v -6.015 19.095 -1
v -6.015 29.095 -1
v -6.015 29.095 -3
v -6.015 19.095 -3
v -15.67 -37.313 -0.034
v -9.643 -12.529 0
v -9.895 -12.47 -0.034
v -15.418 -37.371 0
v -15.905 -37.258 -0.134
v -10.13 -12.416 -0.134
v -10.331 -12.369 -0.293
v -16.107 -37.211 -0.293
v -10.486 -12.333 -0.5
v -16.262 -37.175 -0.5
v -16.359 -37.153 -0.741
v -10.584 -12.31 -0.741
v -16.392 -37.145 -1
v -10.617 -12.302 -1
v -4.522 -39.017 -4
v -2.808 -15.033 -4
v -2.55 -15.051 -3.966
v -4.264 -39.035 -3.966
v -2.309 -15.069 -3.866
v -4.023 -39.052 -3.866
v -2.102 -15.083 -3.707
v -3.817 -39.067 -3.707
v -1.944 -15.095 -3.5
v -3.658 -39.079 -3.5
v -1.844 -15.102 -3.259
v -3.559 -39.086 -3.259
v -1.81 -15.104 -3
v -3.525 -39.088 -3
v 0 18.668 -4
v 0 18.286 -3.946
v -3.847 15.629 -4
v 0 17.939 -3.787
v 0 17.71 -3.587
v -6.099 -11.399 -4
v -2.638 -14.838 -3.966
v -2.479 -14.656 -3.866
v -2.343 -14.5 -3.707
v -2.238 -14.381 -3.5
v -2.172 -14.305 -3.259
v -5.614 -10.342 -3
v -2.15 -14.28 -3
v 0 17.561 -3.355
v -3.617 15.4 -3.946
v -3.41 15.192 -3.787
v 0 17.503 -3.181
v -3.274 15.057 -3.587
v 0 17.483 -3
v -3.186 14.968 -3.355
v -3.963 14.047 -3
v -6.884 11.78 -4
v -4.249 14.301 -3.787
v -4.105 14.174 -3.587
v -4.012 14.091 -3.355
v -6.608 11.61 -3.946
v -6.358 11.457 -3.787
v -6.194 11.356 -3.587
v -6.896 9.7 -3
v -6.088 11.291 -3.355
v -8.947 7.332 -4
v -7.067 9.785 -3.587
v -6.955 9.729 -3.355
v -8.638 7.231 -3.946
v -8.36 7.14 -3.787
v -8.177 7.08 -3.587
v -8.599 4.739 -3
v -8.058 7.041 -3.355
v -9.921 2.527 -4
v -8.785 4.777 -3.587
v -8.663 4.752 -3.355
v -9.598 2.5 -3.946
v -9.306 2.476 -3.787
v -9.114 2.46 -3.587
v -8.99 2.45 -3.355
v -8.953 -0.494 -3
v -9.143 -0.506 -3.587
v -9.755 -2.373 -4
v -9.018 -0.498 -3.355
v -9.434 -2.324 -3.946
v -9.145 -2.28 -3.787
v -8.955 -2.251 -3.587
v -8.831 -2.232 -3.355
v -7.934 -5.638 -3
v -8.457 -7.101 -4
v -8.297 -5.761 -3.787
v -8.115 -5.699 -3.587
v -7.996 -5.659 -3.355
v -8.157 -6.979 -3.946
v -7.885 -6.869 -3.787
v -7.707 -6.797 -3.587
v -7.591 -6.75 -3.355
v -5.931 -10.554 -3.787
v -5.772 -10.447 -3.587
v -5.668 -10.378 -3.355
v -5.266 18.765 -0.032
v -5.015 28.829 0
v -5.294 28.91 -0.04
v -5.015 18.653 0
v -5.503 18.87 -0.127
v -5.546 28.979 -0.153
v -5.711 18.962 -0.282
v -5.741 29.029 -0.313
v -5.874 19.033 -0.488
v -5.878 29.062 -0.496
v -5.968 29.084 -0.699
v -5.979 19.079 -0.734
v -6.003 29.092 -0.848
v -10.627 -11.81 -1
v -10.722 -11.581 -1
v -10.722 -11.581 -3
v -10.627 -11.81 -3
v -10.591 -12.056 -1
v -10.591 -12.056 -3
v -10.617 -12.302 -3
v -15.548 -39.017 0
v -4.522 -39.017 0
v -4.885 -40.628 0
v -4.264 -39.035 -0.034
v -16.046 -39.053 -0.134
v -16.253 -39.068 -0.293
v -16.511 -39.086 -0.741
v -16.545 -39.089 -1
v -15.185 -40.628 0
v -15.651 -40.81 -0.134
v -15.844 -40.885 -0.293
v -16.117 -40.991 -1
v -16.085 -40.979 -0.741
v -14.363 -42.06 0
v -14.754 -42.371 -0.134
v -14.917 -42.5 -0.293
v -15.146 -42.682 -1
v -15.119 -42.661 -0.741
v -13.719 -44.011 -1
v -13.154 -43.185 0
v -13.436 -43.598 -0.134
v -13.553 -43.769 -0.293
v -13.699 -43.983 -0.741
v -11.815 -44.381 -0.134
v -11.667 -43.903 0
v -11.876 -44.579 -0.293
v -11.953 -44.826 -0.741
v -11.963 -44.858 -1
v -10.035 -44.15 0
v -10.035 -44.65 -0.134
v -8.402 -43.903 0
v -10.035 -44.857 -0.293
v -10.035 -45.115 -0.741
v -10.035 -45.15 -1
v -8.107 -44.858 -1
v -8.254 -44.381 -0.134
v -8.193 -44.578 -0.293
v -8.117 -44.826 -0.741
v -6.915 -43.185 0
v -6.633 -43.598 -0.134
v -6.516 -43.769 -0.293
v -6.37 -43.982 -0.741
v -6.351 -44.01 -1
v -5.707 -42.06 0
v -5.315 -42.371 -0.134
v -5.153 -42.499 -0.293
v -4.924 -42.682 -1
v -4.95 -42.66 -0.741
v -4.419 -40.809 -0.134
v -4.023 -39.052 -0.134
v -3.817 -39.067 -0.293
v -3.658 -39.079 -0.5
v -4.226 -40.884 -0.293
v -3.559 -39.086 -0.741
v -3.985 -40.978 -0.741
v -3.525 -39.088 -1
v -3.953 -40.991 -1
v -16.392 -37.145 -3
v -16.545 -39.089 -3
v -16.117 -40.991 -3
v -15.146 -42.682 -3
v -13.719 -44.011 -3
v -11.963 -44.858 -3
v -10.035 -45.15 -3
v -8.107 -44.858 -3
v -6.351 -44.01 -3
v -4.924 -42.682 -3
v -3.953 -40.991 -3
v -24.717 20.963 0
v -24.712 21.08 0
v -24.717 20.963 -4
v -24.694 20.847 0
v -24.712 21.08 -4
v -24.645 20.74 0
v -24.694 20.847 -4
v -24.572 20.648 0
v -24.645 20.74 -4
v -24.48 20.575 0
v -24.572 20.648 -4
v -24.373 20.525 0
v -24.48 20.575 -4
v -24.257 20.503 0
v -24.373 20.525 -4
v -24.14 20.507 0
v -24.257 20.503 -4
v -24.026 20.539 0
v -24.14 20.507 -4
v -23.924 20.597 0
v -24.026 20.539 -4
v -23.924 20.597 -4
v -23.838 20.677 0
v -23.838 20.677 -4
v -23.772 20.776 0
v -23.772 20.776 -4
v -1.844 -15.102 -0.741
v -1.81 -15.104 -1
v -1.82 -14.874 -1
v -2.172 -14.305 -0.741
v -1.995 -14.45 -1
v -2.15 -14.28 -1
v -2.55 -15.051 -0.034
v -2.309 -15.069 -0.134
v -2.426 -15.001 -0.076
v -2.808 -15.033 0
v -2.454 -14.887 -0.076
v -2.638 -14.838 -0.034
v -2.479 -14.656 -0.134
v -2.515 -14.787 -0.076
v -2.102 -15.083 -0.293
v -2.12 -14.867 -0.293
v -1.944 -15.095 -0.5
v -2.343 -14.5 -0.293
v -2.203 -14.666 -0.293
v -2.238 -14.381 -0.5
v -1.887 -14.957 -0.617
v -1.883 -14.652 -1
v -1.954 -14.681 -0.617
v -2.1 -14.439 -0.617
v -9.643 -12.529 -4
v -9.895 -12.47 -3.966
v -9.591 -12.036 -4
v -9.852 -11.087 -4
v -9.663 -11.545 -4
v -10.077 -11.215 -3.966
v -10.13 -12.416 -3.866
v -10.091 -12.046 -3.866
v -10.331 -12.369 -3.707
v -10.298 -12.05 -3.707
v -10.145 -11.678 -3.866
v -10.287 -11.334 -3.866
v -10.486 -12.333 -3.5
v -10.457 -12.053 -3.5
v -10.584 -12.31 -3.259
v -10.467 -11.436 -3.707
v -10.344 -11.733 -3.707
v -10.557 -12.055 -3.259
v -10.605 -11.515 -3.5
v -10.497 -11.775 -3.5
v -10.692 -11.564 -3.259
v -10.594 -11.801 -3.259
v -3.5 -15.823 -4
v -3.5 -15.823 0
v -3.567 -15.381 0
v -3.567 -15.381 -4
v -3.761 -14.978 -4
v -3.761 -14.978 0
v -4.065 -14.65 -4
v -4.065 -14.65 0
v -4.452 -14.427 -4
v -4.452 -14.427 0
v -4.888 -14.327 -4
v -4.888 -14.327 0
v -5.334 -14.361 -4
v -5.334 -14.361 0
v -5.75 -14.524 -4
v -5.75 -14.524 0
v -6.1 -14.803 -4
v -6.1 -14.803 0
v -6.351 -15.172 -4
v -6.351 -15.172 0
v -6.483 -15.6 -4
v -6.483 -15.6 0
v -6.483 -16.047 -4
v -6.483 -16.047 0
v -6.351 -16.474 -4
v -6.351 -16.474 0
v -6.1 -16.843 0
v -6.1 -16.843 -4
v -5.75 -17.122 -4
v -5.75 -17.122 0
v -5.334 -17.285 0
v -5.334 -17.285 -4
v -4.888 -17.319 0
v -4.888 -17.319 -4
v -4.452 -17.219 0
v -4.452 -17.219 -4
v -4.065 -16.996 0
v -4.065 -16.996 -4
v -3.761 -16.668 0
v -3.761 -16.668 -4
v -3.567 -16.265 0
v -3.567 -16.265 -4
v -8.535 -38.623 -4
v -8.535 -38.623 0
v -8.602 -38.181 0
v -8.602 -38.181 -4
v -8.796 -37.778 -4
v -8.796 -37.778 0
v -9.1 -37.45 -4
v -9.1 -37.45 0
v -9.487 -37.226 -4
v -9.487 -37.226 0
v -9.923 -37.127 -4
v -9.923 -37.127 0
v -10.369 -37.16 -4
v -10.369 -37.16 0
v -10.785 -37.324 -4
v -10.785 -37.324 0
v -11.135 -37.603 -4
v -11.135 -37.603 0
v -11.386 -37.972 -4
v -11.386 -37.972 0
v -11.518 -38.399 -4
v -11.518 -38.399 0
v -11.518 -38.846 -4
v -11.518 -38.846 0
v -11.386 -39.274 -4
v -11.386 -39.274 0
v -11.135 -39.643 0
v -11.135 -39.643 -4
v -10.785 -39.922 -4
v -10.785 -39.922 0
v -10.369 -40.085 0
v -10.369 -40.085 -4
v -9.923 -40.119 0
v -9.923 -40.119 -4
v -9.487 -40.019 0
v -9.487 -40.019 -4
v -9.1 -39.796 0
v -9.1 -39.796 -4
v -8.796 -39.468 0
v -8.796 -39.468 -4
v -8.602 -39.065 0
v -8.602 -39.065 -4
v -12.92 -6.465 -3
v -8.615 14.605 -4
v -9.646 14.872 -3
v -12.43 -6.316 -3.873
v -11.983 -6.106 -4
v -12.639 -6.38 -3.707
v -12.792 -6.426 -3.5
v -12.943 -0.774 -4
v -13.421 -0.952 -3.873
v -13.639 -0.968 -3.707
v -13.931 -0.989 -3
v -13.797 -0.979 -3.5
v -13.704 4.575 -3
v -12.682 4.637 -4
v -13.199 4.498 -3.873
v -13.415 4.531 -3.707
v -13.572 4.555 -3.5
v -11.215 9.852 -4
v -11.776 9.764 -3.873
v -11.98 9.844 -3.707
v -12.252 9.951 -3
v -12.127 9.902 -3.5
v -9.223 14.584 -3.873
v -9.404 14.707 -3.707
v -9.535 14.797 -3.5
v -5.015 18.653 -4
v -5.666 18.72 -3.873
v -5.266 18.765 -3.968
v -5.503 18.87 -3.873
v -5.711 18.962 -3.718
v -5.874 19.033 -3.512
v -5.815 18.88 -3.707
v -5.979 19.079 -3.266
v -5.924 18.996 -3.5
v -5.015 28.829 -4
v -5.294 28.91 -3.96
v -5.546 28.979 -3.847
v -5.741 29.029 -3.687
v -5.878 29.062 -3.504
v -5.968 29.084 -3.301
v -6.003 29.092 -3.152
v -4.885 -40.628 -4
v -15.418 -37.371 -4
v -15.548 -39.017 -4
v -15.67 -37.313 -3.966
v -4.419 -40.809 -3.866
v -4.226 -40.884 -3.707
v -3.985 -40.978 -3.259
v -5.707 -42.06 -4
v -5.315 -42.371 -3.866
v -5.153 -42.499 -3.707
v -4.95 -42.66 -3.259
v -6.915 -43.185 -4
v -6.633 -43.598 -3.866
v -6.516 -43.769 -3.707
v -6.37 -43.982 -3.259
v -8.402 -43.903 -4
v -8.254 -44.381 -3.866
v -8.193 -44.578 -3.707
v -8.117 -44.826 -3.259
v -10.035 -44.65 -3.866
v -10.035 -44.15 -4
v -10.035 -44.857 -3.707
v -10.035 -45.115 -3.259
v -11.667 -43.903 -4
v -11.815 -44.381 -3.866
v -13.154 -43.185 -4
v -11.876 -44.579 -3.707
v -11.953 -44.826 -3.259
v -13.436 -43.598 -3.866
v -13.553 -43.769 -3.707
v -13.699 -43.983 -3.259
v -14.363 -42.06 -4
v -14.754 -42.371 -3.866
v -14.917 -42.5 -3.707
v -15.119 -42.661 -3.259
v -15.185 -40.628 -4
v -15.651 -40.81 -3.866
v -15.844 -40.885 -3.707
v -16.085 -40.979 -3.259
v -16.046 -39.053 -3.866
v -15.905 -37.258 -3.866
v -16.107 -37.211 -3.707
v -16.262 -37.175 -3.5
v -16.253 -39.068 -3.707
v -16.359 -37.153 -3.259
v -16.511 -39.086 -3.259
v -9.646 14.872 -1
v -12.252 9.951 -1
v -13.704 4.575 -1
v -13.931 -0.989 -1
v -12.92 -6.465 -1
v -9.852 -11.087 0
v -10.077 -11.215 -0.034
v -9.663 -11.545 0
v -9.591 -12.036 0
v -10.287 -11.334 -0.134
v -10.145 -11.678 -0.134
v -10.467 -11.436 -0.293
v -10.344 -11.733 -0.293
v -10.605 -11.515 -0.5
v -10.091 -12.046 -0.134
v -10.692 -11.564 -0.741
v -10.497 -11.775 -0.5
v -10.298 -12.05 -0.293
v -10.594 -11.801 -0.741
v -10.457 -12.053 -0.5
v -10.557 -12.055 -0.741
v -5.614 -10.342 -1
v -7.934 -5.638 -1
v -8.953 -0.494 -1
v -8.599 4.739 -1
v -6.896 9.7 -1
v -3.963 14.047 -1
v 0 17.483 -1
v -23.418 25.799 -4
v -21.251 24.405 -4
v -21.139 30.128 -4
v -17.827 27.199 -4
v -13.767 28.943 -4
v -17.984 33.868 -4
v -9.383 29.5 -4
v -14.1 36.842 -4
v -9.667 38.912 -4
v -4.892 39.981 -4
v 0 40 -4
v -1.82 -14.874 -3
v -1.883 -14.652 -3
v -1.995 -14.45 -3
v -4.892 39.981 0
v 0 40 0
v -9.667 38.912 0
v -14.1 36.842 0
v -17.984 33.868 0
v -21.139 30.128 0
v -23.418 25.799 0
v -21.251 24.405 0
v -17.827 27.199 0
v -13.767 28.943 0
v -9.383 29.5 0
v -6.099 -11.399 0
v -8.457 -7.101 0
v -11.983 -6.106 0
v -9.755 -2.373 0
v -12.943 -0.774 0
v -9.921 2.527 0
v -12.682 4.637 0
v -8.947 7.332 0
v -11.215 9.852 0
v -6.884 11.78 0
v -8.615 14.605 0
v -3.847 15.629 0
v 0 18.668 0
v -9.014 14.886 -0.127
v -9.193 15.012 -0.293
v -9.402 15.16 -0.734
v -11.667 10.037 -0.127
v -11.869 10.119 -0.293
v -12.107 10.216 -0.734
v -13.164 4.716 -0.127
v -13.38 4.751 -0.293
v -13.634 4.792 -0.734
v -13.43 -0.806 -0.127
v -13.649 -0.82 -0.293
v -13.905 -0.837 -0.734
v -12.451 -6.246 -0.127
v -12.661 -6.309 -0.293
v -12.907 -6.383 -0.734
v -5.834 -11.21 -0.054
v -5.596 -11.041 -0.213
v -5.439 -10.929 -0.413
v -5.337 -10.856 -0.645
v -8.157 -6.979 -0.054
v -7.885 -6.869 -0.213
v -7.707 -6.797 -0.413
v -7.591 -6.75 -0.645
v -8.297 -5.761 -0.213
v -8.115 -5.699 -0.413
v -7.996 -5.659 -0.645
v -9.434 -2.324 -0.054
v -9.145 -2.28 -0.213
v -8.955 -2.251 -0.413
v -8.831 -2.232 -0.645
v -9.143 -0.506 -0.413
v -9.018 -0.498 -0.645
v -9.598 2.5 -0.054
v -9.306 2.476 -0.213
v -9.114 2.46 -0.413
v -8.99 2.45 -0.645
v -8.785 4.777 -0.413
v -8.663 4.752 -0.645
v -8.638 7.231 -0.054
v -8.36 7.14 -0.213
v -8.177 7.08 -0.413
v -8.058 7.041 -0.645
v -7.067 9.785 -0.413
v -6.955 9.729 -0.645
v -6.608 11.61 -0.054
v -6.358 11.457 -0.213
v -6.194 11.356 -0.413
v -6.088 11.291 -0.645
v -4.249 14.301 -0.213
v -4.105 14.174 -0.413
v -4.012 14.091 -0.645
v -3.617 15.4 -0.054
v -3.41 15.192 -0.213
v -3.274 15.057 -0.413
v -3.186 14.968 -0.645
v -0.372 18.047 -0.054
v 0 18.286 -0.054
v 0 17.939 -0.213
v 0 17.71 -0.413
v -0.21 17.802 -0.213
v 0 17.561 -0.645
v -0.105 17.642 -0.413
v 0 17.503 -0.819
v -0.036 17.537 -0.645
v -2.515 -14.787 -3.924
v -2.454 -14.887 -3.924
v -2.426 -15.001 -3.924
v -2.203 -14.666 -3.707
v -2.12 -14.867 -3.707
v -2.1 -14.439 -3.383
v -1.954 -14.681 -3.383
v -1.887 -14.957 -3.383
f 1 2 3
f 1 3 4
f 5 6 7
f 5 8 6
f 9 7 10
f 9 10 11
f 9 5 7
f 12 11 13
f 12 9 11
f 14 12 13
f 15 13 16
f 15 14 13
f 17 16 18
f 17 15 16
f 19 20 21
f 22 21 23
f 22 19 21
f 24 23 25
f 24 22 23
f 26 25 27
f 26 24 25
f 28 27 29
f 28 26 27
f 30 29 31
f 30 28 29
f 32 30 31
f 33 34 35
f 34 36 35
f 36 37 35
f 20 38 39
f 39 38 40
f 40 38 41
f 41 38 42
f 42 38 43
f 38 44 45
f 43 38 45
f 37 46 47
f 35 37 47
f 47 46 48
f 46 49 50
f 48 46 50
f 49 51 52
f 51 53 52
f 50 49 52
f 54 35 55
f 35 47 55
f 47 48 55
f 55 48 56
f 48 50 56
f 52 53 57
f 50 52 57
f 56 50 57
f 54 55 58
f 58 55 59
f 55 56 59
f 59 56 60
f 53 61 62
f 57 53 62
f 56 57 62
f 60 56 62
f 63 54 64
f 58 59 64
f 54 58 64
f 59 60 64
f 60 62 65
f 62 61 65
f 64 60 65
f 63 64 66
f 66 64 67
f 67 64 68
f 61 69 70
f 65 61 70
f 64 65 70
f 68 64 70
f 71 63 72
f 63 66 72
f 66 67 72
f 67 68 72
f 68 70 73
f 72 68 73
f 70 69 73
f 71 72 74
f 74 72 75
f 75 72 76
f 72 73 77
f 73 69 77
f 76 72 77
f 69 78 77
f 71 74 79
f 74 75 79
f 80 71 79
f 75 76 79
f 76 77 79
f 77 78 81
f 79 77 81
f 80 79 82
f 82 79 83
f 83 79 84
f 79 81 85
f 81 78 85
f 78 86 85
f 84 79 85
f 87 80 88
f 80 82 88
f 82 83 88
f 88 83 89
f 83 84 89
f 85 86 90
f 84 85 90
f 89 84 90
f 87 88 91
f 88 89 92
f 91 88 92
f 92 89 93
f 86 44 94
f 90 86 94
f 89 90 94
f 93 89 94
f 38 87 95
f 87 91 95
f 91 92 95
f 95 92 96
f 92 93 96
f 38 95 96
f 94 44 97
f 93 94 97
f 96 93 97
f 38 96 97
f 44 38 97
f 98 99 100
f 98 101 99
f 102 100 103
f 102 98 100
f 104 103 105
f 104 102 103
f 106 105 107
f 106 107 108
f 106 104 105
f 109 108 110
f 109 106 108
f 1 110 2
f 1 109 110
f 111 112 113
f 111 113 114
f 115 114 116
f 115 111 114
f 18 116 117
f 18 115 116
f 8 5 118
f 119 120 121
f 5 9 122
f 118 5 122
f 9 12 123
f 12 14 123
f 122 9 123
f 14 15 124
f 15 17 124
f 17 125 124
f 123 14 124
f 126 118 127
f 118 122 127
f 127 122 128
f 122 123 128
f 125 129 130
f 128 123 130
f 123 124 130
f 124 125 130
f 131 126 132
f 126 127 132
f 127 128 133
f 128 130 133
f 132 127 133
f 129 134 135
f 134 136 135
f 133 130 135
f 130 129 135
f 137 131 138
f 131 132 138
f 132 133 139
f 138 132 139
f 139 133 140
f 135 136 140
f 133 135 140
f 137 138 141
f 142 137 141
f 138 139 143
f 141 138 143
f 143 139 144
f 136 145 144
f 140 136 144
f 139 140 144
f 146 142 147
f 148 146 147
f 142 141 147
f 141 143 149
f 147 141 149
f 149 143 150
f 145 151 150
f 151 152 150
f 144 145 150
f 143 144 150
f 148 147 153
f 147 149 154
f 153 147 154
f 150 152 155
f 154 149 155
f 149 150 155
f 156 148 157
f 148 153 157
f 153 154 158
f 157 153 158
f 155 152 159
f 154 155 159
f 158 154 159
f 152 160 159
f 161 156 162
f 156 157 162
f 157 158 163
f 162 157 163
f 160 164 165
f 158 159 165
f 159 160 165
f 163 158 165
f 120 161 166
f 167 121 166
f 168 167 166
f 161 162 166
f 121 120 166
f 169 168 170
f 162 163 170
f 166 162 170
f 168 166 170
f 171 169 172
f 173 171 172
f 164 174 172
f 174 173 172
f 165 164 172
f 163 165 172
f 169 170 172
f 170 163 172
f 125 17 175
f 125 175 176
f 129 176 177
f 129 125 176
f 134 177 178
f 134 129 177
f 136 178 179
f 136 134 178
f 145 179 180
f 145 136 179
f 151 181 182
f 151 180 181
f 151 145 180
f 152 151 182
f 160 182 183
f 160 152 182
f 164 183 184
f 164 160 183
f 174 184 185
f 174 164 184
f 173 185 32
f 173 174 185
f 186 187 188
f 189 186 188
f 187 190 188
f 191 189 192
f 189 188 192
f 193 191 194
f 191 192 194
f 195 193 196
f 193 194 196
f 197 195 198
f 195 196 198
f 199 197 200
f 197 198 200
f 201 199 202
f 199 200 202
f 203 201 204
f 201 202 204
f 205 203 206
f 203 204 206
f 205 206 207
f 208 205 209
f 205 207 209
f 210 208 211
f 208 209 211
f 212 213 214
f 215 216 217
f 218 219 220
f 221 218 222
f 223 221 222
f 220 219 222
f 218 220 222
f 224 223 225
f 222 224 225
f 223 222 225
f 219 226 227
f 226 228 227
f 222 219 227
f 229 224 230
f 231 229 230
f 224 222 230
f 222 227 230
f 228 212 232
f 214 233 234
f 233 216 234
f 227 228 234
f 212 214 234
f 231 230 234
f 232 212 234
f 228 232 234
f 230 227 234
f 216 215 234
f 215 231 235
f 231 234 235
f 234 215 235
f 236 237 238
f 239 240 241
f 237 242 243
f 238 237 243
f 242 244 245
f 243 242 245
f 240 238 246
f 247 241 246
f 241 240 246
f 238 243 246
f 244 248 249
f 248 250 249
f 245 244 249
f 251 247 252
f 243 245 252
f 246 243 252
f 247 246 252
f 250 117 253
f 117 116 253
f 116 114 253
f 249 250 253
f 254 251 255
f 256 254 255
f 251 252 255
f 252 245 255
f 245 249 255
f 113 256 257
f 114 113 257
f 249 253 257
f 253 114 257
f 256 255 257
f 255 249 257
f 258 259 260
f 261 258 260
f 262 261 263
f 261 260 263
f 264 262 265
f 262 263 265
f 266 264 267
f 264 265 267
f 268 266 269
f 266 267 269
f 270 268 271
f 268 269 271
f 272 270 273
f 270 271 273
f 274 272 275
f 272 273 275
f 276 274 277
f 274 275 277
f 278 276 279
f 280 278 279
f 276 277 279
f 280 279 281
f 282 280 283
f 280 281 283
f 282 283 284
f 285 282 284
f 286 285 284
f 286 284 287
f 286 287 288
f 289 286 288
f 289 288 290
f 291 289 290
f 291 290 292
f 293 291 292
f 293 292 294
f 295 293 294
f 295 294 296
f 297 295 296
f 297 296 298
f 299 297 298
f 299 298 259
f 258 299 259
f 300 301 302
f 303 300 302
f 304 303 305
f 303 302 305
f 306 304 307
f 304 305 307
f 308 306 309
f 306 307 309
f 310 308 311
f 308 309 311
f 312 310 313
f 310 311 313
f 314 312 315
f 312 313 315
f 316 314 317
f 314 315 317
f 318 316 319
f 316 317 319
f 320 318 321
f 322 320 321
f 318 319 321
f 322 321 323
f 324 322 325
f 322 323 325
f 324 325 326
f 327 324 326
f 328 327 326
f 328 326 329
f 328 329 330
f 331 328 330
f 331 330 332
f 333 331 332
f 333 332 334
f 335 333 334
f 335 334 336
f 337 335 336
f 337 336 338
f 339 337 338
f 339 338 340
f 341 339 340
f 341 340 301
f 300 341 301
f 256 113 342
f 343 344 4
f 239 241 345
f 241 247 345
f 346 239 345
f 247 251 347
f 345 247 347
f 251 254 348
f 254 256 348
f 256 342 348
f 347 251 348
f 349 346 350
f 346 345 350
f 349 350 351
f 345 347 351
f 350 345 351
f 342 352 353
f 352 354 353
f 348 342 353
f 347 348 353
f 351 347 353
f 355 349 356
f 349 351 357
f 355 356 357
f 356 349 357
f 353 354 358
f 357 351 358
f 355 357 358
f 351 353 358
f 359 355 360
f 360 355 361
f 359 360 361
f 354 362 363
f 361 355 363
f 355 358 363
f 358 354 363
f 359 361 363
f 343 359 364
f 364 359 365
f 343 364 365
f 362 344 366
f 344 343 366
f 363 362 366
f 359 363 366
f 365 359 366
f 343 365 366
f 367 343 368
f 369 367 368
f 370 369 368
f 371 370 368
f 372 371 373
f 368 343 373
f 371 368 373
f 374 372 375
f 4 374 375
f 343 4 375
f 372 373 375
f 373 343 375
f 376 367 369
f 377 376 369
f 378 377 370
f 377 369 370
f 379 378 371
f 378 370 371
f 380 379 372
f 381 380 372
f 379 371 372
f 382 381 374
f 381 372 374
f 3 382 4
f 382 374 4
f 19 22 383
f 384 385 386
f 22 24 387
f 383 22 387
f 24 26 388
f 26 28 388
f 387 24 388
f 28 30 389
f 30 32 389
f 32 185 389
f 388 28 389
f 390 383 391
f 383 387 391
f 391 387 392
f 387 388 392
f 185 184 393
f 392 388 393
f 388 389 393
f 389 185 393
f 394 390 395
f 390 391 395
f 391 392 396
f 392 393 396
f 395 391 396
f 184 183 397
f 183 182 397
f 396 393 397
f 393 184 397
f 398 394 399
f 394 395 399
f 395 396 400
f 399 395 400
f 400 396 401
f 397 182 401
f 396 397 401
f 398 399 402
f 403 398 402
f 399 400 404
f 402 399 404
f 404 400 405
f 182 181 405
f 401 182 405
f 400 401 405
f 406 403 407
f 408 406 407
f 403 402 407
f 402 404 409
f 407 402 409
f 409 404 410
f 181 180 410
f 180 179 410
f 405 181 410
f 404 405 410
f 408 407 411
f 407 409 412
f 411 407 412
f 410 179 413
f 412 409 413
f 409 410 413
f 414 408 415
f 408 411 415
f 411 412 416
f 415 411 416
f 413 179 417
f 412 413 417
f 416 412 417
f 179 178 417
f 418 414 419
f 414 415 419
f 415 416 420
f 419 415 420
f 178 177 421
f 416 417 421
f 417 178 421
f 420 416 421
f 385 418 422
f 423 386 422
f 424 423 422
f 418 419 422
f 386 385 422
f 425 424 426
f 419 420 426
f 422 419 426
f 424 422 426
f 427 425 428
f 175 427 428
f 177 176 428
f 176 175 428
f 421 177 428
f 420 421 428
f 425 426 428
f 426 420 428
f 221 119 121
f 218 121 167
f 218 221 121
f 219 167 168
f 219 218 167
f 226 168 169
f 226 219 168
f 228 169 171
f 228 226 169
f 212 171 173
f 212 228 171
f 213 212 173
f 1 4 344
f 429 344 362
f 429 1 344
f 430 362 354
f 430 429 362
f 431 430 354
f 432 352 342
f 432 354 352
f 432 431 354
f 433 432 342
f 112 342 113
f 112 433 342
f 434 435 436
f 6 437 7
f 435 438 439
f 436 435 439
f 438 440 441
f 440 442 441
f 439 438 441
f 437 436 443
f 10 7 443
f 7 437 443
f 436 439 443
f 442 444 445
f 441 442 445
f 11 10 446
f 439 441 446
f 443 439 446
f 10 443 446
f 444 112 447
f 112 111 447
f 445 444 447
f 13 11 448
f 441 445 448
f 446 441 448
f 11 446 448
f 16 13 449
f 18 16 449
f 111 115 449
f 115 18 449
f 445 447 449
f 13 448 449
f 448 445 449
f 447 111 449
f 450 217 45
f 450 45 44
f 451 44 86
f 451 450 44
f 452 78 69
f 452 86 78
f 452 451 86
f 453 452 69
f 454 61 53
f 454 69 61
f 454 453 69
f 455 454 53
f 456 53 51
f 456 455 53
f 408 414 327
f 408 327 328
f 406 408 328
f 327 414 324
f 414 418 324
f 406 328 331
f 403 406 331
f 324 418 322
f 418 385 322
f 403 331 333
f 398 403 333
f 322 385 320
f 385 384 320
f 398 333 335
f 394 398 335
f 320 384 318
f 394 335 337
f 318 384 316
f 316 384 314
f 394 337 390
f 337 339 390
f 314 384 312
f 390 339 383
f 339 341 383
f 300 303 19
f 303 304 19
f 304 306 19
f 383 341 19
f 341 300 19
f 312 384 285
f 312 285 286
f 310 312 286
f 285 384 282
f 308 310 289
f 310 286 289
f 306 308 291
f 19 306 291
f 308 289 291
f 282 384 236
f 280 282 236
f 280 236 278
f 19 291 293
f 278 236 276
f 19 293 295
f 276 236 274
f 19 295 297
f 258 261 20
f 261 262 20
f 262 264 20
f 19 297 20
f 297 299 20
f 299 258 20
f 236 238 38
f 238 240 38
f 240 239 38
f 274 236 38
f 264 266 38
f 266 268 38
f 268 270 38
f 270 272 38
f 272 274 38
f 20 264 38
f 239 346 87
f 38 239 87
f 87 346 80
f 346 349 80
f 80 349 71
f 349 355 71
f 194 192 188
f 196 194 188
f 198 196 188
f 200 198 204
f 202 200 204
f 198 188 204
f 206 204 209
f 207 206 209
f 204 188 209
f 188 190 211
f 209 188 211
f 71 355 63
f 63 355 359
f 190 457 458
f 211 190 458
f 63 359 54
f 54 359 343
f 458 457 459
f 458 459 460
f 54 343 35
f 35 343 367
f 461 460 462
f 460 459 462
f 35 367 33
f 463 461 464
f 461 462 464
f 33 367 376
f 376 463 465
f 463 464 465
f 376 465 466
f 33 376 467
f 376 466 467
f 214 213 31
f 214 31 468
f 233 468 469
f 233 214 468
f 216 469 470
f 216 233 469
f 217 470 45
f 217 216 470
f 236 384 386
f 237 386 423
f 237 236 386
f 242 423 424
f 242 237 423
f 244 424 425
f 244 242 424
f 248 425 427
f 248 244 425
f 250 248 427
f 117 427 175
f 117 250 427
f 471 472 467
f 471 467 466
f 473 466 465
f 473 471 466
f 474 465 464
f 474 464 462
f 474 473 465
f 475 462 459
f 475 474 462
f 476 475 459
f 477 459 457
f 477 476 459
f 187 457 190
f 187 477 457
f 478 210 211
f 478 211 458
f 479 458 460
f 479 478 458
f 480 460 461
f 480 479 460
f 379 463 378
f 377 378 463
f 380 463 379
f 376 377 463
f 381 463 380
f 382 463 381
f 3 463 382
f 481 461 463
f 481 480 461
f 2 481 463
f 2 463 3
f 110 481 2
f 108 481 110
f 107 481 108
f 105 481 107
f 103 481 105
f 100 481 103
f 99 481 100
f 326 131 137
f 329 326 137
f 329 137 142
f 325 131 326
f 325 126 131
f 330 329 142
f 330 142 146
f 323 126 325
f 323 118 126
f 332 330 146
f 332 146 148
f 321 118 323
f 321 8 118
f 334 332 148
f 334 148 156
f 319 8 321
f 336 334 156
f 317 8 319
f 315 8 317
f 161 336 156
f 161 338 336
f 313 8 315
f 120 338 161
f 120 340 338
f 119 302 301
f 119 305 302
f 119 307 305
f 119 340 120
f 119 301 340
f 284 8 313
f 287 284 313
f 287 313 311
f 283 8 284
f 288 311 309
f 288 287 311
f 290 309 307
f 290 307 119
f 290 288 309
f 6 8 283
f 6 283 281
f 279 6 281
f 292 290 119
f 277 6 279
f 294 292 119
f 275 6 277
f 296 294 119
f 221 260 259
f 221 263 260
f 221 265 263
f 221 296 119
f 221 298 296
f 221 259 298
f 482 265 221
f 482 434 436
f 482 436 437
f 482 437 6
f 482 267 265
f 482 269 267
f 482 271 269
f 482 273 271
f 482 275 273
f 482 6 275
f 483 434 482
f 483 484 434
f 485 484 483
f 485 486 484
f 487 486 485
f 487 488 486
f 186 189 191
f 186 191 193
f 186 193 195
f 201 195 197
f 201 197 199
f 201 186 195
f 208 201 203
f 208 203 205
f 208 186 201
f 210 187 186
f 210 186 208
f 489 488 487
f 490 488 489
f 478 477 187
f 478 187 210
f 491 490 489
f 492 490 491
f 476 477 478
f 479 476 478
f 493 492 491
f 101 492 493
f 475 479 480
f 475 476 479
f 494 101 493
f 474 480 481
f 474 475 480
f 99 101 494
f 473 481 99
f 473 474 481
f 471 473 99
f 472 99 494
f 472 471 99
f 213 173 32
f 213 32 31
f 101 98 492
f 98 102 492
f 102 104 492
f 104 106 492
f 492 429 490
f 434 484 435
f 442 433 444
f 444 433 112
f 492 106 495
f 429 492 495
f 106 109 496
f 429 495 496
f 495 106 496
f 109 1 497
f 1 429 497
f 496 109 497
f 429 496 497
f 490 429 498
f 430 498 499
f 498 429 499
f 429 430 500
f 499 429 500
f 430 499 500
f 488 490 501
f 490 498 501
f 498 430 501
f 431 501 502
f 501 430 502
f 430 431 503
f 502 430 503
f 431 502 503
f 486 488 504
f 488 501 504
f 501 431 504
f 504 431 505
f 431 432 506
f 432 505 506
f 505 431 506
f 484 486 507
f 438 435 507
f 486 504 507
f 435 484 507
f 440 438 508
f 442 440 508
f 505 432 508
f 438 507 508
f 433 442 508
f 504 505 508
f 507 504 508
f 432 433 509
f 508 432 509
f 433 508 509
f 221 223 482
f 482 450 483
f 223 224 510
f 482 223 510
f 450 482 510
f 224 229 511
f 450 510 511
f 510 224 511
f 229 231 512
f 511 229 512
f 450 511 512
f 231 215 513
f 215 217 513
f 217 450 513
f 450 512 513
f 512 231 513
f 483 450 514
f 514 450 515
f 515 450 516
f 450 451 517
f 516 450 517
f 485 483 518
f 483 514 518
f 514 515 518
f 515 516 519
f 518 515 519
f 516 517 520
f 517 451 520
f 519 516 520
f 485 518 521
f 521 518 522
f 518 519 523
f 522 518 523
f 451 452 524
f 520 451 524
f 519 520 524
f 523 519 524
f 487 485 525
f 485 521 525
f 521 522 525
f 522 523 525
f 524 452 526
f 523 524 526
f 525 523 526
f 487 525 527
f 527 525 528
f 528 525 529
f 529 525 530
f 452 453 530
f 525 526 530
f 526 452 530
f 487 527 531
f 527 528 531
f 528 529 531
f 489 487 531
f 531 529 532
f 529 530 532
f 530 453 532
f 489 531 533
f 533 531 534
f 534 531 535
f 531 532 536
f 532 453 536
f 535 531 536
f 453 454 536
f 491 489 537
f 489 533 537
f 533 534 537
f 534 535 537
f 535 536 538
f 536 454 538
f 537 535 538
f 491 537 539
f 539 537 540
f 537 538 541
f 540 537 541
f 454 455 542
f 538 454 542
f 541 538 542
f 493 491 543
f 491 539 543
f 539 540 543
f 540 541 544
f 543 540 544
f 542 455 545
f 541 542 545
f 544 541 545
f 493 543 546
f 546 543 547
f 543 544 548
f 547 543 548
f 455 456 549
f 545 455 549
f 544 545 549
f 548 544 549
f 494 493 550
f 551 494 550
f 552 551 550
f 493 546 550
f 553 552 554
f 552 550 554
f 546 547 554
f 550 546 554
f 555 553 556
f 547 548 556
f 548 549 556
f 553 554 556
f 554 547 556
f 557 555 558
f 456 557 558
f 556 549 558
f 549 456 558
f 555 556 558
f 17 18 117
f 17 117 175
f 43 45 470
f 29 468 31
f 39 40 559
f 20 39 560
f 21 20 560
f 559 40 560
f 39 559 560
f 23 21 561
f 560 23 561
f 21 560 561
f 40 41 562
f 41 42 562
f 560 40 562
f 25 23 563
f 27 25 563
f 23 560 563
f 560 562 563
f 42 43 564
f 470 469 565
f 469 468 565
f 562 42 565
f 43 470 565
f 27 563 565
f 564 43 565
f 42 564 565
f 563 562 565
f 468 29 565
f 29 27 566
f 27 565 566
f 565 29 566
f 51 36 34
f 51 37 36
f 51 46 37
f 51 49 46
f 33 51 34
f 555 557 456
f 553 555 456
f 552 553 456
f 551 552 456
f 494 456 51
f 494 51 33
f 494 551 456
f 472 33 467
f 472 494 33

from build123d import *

# Parameters (mm, degrees)
F1_DEPTH = 4
F2_R     = 0.5
F3_R     = 1
F4_R     = 1
F5_R     = 1.5
F6_DEPTH = 25.4


# Not quite as in the source:
# - a feature names something its author has since deleted; it is built from what else it names


with BuildPart() as f1:
    # F0 (on Top) → F1 (new body)
    with BuildSketch(Plane.XY):
        with BuildLine():
            ThreePointArc((-2.1499598203, -14.279765827), (-8.9479939511, 2.1344933303), (0, 17.482932208))
            Line((0, 17.482932208), (0, 40))
            ThreePointArc((0, 40), (-17.5115843593, 34.3056723382), (-25, 17.482932208))
            ThreePointArc((-25, 17.482932208), (-17.8797085459, 27.1675710157), (-6.0147373006, 29.0945470333))
            Line((-6.0147373006, 29.0945470333), (-6.0147373006, 19.0945470333))
            ThreePointArc((-6.0147373006, 19.0945470333), (-13.7044570112, 4.575418106), (-10.7216048739, -11.5812983662))
            ThreePointArc((-10.7216048739, -11.5812983662), (-10.6011415068, -11.9319286193), (-10.6166990692, -12.3023485965))
            Line((-10.6166990692, -12.3023485965), (-16.3921895572, -37.1448185197))
            ThreePointArc((-16.3921895572, -37.1448185197), (-11.0096096716, -45.0763845561), (-3.5247629898, -39.0881480742))
            Line((-3.5247629898, -39.0881480742), (-1.8103202737, -15.1042462433))
            ThreePointArc((-1.8103202737, -15.1042462433), (-1.8831553034, -14.6520537771), (-2.1499598203, -14.279765827))
        make_face()
    extrude(amount=-F1_DEPTH)

    # F2
    f2_edges = [f1.edges().sort_by_distance(p)[0] for p in [
        (-25, 17.482932, -2),
    ]]
    fillet(f2_edges, radius=F2_R)

    # F3
    f3_edges = [f1.edges().sort_by_distance(p)[0] for p in [
        (-6.014737, 24.094547, 0),
        (-6.014737, 24.094547, -4),
        (-13.704457, 4.575418, 0),
    ]]
    fillet(f3_edges, radius=F3_R)

    # F4
    f4_edges = [f1.edges().sort_by_distance(p)[0] for p in [
        (-13.704457, 4.575418, -4),
    ]]
    fillet(f4_edges, radius=F4_R)

    # F5 (on face) → F6 (cut)
    with BuildSketch(Plane.XY):
        with Locations((-5, -15.8231072128)):
            Circle(F5_R)
        with Locations((-10.0349408695, -38.6227806321)):
            Circle(F5_R)
    extrude(amount=-F6_DEPTH, mode=Mode.SUBTRACT)


solid = f1.part
